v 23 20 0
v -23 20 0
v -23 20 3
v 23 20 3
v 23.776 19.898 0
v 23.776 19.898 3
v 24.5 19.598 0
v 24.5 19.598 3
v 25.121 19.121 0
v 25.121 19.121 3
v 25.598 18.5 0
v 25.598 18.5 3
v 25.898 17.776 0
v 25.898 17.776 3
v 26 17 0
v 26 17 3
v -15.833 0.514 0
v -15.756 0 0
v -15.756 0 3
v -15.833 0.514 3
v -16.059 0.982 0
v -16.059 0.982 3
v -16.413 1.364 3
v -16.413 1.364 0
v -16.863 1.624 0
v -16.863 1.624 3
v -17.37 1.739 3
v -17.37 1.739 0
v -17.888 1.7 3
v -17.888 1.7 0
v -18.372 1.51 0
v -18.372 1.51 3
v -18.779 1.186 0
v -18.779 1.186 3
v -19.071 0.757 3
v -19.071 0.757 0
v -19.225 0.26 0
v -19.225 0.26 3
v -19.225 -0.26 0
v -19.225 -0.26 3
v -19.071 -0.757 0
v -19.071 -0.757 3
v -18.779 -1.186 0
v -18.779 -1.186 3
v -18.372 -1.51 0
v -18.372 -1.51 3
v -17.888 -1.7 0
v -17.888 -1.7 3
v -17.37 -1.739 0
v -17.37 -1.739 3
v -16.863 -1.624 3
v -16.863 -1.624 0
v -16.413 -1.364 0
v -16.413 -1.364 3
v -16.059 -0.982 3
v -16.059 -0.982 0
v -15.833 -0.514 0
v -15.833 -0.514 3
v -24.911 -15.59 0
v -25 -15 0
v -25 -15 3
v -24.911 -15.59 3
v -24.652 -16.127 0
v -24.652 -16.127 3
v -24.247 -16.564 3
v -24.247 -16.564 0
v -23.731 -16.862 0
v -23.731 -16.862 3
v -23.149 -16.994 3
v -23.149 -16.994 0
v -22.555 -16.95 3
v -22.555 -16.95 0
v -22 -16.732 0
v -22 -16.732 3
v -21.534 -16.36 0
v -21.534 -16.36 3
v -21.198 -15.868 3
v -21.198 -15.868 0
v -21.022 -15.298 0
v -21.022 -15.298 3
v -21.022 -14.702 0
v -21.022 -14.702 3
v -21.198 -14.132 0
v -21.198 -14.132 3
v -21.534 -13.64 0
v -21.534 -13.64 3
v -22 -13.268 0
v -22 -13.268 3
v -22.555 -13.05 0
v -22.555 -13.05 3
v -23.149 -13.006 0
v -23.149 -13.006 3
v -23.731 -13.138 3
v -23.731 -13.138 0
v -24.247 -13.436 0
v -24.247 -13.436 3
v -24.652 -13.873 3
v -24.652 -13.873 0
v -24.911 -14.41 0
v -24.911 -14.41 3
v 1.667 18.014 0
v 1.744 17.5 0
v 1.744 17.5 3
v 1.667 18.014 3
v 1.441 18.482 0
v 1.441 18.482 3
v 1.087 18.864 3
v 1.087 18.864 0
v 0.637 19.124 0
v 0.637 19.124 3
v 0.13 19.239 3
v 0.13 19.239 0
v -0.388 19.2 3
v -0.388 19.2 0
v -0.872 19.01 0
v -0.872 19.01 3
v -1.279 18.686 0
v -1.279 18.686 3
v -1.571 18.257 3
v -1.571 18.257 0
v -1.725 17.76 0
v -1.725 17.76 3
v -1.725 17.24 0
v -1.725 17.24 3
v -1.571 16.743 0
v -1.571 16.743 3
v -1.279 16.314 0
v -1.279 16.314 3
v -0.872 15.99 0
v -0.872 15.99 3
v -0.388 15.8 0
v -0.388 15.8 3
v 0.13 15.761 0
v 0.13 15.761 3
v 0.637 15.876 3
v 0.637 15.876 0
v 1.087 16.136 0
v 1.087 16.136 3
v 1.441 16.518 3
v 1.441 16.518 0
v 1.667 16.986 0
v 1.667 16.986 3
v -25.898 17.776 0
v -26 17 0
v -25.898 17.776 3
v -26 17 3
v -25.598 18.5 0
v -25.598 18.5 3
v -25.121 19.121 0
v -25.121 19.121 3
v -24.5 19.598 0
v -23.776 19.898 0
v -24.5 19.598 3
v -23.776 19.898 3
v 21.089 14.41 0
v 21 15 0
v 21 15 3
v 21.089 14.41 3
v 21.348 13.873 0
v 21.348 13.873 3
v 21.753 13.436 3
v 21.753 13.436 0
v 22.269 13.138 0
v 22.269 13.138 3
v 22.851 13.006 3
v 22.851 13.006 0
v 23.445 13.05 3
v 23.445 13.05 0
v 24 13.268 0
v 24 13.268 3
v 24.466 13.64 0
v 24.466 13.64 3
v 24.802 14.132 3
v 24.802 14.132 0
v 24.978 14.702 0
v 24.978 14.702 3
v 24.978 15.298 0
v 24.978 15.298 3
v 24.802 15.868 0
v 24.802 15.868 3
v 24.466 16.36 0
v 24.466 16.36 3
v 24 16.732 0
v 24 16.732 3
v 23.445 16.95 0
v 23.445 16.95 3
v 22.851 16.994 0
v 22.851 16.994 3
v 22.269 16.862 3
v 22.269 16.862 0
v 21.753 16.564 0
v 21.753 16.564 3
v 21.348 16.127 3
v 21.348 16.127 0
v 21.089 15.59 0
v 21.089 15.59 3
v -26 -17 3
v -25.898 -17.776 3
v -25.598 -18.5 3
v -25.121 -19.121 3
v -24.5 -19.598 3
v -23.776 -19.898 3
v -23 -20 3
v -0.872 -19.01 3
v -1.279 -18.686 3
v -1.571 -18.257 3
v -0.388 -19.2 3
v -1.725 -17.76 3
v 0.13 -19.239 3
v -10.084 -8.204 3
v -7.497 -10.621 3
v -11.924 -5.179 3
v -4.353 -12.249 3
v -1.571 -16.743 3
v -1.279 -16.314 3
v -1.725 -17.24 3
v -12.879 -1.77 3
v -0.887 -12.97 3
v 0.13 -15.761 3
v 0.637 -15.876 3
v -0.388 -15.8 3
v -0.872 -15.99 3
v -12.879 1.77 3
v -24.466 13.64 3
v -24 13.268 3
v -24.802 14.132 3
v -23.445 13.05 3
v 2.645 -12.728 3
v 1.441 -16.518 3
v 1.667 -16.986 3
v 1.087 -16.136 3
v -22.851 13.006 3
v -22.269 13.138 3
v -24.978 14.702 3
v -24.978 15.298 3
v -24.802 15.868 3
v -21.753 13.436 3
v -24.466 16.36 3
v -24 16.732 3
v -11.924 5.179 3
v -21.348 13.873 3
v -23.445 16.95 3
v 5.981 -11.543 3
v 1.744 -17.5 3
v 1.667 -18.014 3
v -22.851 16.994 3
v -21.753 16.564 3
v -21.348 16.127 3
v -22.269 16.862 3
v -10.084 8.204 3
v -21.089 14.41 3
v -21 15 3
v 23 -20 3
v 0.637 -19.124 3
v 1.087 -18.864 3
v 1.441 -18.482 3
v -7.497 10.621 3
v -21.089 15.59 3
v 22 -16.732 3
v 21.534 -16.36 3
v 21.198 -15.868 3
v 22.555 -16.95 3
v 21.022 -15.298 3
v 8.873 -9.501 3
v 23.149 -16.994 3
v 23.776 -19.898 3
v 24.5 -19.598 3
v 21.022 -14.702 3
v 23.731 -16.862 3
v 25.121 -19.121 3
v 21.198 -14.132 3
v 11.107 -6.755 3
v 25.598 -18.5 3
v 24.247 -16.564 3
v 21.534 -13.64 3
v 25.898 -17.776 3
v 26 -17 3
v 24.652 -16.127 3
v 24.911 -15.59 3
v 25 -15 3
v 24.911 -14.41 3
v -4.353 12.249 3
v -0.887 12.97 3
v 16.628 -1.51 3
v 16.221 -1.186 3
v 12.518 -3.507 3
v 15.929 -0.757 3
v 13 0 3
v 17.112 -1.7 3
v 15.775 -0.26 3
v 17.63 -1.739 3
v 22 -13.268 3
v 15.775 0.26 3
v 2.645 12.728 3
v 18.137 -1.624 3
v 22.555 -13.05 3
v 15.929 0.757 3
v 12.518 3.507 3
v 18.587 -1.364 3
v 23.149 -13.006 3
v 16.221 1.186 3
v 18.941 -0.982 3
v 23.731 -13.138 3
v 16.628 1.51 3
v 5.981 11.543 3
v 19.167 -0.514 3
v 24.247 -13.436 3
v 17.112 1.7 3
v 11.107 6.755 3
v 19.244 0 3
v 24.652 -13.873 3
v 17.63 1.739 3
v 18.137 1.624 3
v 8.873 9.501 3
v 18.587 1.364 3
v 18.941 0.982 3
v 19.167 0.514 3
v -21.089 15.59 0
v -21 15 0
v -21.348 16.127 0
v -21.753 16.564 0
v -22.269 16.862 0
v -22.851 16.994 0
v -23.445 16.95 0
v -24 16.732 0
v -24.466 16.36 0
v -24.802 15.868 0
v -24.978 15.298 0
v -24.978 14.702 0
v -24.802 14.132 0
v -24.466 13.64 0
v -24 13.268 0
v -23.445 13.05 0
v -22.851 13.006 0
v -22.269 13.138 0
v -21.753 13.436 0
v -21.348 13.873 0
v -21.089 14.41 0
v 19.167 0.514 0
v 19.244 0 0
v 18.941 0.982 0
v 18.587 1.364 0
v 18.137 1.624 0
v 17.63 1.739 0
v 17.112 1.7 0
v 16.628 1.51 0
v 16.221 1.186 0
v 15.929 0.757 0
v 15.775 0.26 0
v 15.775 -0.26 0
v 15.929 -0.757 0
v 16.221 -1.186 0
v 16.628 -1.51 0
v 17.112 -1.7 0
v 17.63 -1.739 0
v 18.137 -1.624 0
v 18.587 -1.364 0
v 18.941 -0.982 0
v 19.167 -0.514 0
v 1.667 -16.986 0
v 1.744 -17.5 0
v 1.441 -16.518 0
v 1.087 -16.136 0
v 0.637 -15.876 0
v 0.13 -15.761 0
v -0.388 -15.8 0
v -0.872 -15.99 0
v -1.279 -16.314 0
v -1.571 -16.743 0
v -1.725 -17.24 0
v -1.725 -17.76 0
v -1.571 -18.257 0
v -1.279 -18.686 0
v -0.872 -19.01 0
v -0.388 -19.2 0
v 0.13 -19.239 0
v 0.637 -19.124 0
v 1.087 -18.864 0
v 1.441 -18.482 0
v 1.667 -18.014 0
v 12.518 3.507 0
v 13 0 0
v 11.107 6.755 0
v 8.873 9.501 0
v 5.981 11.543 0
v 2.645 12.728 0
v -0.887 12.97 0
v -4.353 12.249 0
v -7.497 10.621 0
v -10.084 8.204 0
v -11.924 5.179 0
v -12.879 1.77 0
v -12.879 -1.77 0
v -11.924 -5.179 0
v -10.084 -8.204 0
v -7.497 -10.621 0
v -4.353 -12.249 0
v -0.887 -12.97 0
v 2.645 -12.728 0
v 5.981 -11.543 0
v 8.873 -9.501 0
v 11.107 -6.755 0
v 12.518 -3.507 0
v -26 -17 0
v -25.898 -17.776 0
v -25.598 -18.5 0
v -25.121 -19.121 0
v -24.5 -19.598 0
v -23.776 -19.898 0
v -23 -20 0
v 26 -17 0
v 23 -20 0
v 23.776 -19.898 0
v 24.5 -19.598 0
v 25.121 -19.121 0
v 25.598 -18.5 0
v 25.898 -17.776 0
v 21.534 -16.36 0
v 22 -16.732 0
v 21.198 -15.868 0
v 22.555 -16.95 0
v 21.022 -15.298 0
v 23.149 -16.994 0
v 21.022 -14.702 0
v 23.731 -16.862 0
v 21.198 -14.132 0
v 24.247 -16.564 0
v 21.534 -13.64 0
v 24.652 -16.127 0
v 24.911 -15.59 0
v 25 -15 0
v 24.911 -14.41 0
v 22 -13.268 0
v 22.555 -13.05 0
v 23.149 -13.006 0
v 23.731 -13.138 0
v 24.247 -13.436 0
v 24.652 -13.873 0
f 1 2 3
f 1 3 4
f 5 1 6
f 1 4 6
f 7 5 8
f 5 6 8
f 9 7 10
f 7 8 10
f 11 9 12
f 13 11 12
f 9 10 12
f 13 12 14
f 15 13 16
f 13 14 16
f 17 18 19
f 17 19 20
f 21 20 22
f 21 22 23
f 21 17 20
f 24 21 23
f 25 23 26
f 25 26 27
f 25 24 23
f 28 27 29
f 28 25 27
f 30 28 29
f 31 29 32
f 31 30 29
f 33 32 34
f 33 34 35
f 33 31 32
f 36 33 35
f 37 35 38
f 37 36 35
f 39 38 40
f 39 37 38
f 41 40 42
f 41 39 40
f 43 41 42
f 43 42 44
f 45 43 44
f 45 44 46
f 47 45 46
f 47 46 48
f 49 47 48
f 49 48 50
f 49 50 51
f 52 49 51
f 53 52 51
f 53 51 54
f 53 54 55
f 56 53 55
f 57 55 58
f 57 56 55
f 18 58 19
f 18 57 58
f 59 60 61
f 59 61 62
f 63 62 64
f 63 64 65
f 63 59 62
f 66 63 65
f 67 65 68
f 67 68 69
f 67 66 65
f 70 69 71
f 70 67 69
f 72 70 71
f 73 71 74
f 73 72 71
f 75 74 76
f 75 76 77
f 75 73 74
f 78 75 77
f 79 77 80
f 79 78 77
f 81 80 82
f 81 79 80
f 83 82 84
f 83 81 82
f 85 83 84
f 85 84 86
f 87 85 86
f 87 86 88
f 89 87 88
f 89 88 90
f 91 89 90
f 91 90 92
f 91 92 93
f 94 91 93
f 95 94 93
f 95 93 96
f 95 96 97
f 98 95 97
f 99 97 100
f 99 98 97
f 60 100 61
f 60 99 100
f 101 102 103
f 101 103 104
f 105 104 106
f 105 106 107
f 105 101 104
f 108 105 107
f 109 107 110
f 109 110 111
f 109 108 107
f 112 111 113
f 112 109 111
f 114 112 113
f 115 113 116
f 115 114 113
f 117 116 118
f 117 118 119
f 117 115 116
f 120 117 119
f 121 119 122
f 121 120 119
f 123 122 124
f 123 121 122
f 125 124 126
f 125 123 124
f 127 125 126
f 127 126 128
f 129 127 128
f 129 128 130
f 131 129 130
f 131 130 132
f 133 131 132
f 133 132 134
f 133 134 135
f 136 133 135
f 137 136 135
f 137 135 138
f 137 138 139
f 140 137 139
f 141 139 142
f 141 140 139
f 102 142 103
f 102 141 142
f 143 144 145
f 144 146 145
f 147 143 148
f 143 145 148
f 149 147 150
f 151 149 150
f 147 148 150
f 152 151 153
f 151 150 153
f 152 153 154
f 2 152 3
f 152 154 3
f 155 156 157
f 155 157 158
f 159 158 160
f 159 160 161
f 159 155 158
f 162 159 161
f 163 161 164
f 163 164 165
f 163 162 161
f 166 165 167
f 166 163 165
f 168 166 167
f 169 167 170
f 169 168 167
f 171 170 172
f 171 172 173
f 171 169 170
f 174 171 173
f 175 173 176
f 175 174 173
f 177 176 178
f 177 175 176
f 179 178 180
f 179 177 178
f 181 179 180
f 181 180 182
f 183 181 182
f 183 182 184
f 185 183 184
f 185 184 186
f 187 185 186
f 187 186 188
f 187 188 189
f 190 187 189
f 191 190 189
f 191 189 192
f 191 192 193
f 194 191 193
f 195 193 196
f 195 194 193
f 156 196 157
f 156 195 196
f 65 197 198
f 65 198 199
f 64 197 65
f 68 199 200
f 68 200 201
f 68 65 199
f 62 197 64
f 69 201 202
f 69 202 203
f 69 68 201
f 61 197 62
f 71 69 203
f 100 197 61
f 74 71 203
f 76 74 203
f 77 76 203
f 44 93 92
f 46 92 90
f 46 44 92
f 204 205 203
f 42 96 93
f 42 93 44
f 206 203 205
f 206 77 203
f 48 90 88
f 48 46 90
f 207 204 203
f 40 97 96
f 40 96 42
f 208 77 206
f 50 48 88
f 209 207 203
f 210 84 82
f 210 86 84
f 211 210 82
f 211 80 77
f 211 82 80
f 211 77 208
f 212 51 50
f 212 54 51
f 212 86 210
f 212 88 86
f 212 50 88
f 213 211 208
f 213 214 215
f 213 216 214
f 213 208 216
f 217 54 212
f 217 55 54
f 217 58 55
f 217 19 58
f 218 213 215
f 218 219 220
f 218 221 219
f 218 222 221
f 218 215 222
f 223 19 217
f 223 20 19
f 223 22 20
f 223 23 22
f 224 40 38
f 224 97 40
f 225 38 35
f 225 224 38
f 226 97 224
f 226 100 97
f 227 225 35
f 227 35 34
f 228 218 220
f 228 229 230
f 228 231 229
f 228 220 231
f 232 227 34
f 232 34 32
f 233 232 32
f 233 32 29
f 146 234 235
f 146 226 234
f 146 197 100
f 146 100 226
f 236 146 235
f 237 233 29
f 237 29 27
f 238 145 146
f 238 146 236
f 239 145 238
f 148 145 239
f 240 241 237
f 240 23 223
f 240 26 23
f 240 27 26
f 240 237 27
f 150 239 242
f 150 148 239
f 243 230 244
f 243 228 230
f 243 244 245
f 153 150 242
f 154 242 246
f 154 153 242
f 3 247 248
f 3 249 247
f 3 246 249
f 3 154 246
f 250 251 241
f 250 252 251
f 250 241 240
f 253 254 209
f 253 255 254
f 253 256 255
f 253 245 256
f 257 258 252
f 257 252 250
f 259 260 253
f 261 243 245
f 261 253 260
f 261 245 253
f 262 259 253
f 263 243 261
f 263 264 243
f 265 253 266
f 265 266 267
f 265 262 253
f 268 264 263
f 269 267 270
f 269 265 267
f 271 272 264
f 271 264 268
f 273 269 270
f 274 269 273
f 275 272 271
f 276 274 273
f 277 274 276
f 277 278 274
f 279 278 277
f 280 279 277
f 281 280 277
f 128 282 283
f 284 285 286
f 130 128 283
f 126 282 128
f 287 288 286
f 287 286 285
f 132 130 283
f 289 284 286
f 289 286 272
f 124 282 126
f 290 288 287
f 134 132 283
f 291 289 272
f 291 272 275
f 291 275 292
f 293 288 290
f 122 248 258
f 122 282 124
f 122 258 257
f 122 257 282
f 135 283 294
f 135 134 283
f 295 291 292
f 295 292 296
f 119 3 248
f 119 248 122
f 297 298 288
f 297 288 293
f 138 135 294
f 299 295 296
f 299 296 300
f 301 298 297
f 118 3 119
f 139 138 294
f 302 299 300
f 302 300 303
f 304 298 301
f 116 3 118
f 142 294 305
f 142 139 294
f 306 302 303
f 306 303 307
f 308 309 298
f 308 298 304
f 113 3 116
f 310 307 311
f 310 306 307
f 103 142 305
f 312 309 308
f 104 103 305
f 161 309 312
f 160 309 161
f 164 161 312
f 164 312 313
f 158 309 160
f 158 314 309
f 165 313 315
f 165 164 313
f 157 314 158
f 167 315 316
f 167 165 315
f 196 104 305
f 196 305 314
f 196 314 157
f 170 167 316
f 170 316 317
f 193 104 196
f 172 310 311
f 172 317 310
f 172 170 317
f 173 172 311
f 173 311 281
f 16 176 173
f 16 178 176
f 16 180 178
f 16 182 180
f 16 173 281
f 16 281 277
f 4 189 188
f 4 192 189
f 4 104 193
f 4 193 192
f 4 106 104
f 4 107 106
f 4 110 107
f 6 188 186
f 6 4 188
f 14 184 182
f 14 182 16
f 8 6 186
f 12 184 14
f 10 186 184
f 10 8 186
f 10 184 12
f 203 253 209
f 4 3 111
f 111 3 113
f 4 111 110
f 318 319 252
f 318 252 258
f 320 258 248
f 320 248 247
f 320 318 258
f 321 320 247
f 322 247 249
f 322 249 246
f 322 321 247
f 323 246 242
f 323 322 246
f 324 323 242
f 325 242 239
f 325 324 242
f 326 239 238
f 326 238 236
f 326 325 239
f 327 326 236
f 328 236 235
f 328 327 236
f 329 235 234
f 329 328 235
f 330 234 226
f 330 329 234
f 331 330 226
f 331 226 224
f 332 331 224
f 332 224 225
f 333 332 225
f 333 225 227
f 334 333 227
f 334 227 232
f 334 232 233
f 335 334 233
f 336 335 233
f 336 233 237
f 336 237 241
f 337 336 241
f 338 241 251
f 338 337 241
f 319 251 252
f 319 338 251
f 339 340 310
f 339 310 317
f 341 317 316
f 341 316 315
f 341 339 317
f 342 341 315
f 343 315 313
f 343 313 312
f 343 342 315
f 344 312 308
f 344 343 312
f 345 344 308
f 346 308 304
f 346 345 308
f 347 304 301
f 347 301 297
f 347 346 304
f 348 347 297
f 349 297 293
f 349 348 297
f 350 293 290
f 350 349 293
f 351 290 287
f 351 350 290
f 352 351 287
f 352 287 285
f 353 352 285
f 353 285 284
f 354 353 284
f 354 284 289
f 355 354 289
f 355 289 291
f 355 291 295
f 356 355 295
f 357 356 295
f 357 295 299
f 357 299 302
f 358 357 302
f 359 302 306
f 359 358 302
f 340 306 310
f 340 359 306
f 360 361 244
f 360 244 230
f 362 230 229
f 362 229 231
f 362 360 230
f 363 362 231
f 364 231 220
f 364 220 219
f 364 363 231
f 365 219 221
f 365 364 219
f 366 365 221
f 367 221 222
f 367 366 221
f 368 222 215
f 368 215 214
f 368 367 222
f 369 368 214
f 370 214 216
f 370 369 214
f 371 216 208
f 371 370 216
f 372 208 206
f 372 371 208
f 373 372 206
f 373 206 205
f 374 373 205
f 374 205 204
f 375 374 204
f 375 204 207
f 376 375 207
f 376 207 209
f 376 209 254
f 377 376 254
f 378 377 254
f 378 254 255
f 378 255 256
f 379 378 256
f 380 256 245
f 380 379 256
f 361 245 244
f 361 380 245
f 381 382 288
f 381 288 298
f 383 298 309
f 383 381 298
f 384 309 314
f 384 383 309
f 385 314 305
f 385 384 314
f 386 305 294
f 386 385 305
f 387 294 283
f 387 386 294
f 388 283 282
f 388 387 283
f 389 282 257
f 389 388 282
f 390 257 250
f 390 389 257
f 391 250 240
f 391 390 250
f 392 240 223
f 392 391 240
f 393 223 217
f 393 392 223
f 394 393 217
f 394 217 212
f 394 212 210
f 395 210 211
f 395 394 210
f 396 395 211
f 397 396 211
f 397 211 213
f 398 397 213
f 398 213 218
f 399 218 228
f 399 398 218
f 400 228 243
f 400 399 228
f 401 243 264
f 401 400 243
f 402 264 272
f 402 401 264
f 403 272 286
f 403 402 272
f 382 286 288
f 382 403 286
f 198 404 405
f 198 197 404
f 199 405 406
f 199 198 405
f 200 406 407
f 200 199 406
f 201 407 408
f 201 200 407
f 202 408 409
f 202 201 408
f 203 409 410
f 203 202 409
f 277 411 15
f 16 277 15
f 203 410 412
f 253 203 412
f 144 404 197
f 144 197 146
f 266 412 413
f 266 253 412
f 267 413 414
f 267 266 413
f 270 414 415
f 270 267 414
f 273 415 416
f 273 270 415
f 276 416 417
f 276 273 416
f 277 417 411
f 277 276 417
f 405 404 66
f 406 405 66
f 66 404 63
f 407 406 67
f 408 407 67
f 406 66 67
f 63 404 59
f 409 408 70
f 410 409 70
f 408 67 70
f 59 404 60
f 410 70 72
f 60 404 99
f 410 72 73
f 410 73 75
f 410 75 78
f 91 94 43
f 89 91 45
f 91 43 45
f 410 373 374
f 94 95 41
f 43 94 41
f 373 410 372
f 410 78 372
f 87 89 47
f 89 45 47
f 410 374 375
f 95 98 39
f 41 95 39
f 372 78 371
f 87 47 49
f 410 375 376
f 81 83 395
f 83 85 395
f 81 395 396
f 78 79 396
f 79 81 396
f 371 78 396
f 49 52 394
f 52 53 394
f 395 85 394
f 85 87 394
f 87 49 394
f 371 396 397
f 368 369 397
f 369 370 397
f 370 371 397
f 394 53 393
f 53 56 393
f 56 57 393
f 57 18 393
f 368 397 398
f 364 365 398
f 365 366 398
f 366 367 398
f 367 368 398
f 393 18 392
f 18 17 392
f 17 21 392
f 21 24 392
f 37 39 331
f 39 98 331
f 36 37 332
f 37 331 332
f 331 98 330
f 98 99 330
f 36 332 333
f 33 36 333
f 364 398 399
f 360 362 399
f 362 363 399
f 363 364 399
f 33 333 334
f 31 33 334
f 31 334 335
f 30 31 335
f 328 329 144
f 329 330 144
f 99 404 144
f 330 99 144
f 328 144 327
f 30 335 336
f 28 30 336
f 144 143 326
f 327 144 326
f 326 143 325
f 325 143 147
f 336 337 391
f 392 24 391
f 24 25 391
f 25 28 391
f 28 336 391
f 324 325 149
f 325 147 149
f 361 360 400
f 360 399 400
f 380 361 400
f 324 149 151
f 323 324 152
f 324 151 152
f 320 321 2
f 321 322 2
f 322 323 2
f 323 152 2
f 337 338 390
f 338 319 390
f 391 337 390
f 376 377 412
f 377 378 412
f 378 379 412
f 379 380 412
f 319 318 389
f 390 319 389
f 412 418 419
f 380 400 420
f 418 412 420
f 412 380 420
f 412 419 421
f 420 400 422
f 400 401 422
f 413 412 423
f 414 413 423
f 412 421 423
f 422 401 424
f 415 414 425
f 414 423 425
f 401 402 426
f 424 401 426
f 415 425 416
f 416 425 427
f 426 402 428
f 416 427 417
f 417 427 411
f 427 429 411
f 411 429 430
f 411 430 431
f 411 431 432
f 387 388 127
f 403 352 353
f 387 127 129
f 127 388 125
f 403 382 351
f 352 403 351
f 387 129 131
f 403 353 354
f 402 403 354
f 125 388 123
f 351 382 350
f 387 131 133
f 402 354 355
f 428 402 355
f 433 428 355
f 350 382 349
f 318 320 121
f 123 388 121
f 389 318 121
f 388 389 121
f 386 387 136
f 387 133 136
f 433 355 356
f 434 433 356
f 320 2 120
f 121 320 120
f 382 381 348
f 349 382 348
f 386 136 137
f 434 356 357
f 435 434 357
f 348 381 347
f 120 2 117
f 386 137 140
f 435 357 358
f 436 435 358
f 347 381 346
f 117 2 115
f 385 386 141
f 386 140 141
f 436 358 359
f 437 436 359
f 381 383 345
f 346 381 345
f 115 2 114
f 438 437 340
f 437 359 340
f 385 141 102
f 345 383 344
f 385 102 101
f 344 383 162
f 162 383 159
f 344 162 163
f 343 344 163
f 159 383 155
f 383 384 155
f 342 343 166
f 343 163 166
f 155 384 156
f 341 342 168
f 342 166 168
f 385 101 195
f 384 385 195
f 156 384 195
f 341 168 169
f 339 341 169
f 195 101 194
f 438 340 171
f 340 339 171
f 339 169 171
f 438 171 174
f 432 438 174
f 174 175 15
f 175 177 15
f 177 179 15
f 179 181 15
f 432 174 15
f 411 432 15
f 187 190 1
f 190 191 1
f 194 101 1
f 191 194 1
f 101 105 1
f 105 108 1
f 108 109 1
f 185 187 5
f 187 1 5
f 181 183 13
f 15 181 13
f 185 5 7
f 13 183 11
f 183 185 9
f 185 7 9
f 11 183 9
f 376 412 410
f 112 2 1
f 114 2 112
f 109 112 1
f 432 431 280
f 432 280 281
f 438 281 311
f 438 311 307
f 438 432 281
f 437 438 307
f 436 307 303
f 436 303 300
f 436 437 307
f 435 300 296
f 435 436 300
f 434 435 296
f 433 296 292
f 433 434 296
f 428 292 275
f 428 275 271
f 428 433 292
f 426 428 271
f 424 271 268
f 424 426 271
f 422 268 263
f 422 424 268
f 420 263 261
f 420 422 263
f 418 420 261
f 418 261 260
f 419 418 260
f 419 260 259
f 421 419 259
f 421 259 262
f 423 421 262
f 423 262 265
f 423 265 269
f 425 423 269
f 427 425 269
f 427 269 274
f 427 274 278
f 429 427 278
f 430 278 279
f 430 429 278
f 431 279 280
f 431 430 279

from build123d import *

# Parameters (mm, degrees)
SKETCH_1_W      = 52
SKETCH_1_H      = 40
SKETCH_1_R      = 13
SKETCH_1_R_2    = 1.744116192
SKETCH_1_R_3    = 2
EXTRUDE_1_DEPTH = 3
FILLET_1_R      = 3


with BuildPart() as part:
    # 草图1 → 凸台-拉伸1 (new body)
    with BuildSketch(Plane.XY):
        Rectangle(SKETCH_1_W, SKETCH_1_H)
        Circle(SKETCH_1_R, mode=Mode.SUBTRACT)
        with Locations((0, 17.5)):
            Circle(SKETCH_1_R_2, mode=Mode.SUBTRACT)
        with Locations((17.5, 0)):
            Circle(SKETCH_1_R_2, mode=Mode.SUBTRACT)
        with Locations((0, -17.5)):
            Circle(SKETCH_1_R_2, mode=Mode.SUBTRACT)
        with Locations((-17.5, 0)):
            Circle(SKETCH_1_R_2, mode=Mode.SUBTRACT)
        with Locations((-23, 15)):
            Circle(SKETCH_1_R_3, mode=Mode.SUBTRACT)
        with Locations(Location((23, 15, 0), (0, 0, 180))):
            Circle(SKETCH_1_R_3, mode=Mode.SUBTRACT)
        with Locations((23, -15)):
            Circle(SKETCH_1_R_3, mode=Mode.SUBTRACT)
        with Locations(Location((-23, -15, 0), (0, 0, 180))):
            Circle(SKETCH_1_R_3, mode=Mode.SUBTRACT)
    extrude(amount=EXTRUDE_1_DEPTH)

    # 圆角1
    fillet_1_edges = [part.edges().sort_by_distance(p)[0] for p in [
        (-26, 20, 1.5),
        (26, 20, 1.5),
        (26, -20, 1.5),
        (-26, -20, 1.5),
    ]]
    fillet(fillet_1_edges, radius=FILLET_1_R)


solid = part.part
